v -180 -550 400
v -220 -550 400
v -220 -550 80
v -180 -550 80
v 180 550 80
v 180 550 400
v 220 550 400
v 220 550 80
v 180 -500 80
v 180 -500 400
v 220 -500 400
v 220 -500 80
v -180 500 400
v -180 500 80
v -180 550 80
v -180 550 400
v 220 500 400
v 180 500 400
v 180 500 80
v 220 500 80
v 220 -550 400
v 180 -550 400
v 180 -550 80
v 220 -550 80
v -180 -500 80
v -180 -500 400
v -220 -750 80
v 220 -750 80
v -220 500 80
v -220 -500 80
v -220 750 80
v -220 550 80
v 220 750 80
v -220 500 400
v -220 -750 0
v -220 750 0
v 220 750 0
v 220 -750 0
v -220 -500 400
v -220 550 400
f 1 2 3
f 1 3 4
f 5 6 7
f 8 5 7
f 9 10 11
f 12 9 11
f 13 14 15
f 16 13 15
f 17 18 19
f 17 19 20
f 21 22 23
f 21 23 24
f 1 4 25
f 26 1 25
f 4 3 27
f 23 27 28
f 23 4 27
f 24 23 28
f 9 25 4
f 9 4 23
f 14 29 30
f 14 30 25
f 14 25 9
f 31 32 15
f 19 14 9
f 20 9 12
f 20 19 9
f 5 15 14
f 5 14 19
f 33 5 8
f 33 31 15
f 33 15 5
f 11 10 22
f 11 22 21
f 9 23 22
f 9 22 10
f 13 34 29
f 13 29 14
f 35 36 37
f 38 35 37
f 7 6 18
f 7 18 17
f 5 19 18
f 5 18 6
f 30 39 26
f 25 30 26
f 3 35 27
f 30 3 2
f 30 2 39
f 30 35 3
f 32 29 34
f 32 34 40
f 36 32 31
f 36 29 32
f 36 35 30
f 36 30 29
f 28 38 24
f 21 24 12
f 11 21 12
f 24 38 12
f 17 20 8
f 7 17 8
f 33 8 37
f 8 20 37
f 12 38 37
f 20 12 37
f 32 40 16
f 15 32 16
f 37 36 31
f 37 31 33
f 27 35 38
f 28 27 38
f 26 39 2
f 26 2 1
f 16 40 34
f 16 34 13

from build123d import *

# Parameters (mm, degrees)
SKETCH1_W           = 440
SKETCH1_H           = 1500
BOSS_EXTRUDE1_DEPTH = 80
SKETCH4_W           = 40
SKETCH4_H           = 50
BOSS_EXTRUDE4_DEPTH = 320


with BuildPart() as part:
    # Sketch1 → Boss-Extrude1 (new body)
    with BuildSketch(Plane.XY):
        Rectangle(SKETCH1_W, SKETCH1_H)
    extrude(amount=BOSS_EXTRUDE1_DEPTH)

    # Sketch4 → Boss-Extrude4 (add)
    with BuildSketch(Plane.XY.offset(80)):
        with Locations((-200, 525)):
            Rectangle(SKETCH4_W, SKETCH4_H)
        with Locations((-200, -525)):
            Rectangle(SKETCH4_W, SKETCH4_H)
        with Locations((200, -525)):
            Rectangle(SKETCH4_W, SKETCH4_H)
        with Locations((200, 525)):
            Rectangle(SKETCH4_W, SKETCH4_H)
    extrude(amount=BOSS_EXTRUDE4_DEPTH)


solid = part.part
